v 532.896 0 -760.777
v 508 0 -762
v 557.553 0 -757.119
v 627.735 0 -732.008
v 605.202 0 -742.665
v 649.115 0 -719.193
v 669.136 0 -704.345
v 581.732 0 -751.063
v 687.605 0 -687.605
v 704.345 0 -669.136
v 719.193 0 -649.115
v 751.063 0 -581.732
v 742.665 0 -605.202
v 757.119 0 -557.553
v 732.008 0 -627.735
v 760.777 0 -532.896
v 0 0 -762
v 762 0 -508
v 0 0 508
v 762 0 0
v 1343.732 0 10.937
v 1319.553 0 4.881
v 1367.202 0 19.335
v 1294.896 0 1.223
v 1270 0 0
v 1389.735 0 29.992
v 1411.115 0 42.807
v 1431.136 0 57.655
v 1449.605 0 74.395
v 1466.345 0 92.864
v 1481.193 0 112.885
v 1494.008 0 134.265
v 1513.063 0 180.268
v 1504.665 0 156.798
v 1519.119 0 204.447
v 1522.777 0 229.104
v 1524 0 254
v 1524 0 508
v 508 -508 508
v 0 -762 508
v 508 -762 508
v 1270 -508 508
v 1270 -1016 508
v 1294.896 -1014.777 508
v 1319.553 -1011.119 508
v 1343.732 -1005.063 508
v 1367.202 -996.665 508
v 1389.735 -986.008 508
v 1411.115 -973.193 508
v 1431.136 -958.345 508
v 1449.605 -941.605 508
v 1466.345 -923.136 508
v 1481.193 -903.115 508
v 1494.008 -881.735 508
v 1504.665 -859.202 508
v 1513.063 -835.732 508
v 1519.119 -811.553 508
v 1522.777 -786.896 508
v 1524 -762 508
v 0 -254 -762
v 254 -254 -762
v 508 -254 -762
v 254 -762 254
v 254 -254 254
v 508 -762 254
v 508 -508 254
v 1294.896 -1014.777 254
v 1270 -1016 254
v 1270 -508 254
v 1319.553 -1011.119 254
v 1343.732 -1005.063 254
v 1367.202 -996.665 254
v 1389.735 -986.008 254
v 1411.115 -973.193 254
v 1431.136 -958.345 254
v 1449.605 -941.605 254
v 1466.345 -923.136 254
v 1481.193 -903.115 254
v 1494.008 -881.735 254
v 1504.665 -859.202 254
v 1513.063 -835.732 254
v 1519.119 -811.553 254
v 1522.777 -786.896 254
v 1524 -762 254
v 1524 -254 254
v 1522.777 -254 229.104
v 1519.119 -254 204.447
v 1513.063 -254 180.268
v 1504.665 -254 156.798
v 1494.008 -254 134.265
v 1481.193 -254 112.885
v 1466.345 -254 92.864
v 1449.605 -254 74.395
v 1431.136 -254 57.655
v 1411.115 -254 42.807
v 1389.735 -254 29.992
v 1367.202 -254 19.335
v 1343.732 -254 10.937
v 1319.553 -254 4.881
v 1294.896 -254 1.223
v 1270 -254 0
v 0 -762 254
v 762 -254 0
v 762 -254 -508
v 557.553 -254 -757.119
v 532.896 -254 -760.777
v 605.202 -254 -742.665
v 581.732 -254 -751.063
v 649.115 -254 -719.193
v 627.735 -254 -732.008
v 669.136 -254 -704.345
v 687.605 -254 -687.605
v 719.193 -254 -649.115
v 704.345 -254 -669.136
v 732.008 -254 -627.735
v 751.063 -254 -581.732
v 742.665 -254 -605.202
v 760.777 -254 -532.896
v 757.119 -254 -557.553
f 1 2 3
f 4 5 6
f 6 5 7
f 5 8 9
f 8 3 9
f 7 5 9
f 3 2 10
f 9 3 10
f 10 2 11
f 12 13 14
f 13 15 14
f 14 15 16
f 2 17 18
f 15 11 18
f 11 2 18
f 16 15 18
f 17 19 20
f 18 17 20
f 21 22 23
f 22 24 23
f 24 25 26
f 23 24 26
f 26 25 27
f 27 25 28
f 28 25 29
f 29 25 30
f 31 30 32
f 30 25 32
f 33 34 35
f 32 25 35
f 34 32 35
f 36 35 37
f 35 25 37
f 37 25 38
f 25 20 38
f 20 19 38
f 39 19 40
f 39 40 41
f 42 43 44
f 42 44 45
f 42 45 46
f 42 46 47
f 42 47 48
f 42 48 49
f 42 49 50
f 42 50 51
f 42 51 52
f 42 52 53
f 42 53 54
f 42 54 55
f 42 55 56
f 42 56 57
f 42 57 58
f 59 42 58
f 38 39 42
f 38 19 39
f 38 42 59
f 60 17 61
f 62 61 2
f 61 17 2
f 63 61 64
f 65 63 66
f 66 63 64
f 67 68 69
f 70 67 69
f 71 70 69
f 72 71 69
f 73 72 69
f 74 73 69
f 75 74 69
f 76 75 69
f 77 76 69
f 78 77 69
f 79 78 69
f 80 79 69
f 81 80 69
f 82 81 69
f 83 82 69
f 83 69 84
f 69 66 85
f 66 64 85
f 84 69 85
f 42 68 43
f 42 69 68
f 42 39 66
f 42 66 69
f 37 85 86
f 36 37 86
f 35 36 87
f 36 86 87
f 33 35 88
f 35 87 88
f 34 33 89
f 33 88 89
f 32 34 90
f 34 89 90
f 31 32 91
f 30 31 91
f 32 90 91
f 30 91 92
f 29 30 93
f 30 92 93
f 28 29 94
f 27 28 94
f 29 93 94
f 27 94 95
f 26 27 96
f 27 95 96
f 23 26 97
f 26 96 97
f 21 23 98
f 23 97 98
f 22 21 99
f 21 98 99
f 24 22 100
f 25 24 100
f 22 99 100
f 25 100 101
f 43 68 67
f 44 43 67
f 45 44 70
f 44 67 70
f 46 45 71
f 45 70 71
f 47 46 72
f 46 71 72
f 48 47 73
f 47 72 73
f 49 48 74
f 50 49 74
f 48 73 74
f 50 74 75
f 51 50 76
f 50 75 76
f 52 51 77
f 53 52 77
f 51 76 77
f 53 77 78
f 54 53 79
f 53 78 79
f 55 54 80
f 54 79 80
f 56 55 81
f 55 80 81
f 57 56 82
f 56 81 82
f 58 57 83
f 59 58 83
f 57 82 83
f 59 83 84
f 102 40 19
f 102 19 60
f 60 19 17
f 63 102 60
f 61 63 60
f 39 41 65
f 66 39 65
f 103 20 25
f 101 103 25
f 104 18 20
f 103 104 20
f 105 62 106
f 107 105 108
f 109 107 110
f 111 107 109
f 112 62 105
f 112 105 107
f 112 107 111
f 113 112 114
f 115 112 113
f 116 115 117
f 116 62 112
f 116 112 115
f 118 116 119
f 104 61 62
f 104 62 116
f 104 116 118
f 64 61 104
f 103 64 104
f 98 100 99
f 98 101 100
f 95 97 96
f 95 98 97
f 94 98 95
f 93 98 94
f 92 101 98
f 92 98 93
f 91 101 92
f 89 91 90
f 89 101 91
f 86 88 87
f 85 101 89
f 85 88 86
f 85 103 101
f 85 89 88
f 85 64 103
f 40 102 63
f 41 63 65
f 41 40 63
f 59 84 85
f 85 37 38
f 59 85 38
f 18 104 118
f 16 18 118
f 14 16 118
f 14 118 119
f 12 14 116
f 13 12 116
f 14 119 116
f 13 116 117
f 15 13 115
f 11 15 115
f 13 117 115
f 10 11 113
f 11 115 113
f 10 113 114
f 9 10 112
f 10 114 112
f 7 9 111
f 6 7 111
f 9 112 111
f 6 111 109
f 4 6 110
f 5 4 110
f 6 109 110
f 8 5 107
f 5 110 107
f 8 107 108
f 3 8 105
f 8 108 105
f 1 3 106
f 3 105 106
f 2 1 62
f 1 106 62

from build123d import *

# Parameters (mm, degrees)
F1_DEPTH  = 254
F2_W      = 254
F2_H      = 1016
F3_DEPTH  = 508
F5_DEPTH  = 309.88
F7_DEPTH  = 508
F9_DEPTH  = 254
F10_W     = 254
F10_H     = 254
F11_DEPTH = 254
F13_DEPTH = 254
F15_DEPTH = 254
F17_DEPTH = 254


with BuildPart() as f1:
    # F0 (on Front) → F1 (new body)
    with BuildSketch(Plane.XZ):
        Polygon((1524, 508), (0, 508), (0, -762), (762, -762), (762, 0), (1524, 0), align=None)
    extrude(amount=F1_DEPTH)

    # F2 (on face) → F3 (join)
    with BuildSketch(Plane.XZ.offset(254)):
        with Locations((127, -254)):
            Rectangle(F2_W, F2_H)
    extrude(amount=F3_DEPTH)

    # F4 (on face) → F5 (cut)
    with BuildSketch(Plane(origin=(0, 0, 0), x_dir=(0, -1, 0), z_dir=(-1, 0, 0))):
        Polygon((762, 254), (254, -762), (508, -762), (762, -762), align=None)
    extrude(amount=-F5_DEPTH, mode=Mode.SUBTRACT)

    # F6 (on face) → F7 (join)
    with BuildSketch(Plane.XZ.offset(254)):
        Polygon((1524, 508), (0, 508), (0, 254), (254, 254), (1524, 254), align=None)
    extrude(amount=F7_DEPTH)

    # F8 (on face) → F9 (cut)
    with BuildSketch(Plane.XZ.offset(762)):
        Polygon((762, 508), (508, 508), (508, 254), (1270, 254), (1270, 508), (1016, 508), align=None)
    extrude(amount=-F9_DEPTH, mode=Mode.SUBTRACT)

    # F10 (on face) → F11 (join)
    with BuildSketch(Plane.XZ.offset(762)):
        with Locations((1397, 381)):
            Rectangle(F10_W, F10_H)
    extrude(amount=F11_DEPTH)

    # F12 (on face) → F13 (cut)
    with BuildSketch(Plane.XZ.offset(254)):
        with BuildLine():
            ThreePointArc((762, -508), (687.605122, -687.605122), (508, -762))
            Line((508, -762), (762, -762))
            Line((762, -762), (762, -508))
        make_face()
    extrude(amount=-F13_DEPTH, mode=Mode.SUBTRACT)

    # F14 (on face) → F15 (cut)
    with BuildSketch(Plane.XZ.offset(254)):
        with BuildLine():
            Line((1524, 0), (1524, 254))
            ThreePointArc((1524, 254), (1449.605122, 74.394878), (1270, 0))
            Line((1270, 0), (1524, 0))
        make_face()
    extrude(amount=-F15_DEPTH, mode=Mode.SUBTRACT)

    # F16 (on face) → F17 (cut)
    with BuildSketch(Plane(origin=(0, 0, 254), x_dir=(1, 0, 0), z_dir=(0, 0, -1))):
        with BuildLine():
            Line((1524, 1016), (1270, 1016))
            ThreePointArc((1270, 1016), (1449.605122, 941.605122), (1524, 762))
            Line((1524, 762), (1524, 1016))
        make_face()
    extrude(amount=-F17_DEPTH, mode=Mode.SUBTRACT)


solid = f1.part
